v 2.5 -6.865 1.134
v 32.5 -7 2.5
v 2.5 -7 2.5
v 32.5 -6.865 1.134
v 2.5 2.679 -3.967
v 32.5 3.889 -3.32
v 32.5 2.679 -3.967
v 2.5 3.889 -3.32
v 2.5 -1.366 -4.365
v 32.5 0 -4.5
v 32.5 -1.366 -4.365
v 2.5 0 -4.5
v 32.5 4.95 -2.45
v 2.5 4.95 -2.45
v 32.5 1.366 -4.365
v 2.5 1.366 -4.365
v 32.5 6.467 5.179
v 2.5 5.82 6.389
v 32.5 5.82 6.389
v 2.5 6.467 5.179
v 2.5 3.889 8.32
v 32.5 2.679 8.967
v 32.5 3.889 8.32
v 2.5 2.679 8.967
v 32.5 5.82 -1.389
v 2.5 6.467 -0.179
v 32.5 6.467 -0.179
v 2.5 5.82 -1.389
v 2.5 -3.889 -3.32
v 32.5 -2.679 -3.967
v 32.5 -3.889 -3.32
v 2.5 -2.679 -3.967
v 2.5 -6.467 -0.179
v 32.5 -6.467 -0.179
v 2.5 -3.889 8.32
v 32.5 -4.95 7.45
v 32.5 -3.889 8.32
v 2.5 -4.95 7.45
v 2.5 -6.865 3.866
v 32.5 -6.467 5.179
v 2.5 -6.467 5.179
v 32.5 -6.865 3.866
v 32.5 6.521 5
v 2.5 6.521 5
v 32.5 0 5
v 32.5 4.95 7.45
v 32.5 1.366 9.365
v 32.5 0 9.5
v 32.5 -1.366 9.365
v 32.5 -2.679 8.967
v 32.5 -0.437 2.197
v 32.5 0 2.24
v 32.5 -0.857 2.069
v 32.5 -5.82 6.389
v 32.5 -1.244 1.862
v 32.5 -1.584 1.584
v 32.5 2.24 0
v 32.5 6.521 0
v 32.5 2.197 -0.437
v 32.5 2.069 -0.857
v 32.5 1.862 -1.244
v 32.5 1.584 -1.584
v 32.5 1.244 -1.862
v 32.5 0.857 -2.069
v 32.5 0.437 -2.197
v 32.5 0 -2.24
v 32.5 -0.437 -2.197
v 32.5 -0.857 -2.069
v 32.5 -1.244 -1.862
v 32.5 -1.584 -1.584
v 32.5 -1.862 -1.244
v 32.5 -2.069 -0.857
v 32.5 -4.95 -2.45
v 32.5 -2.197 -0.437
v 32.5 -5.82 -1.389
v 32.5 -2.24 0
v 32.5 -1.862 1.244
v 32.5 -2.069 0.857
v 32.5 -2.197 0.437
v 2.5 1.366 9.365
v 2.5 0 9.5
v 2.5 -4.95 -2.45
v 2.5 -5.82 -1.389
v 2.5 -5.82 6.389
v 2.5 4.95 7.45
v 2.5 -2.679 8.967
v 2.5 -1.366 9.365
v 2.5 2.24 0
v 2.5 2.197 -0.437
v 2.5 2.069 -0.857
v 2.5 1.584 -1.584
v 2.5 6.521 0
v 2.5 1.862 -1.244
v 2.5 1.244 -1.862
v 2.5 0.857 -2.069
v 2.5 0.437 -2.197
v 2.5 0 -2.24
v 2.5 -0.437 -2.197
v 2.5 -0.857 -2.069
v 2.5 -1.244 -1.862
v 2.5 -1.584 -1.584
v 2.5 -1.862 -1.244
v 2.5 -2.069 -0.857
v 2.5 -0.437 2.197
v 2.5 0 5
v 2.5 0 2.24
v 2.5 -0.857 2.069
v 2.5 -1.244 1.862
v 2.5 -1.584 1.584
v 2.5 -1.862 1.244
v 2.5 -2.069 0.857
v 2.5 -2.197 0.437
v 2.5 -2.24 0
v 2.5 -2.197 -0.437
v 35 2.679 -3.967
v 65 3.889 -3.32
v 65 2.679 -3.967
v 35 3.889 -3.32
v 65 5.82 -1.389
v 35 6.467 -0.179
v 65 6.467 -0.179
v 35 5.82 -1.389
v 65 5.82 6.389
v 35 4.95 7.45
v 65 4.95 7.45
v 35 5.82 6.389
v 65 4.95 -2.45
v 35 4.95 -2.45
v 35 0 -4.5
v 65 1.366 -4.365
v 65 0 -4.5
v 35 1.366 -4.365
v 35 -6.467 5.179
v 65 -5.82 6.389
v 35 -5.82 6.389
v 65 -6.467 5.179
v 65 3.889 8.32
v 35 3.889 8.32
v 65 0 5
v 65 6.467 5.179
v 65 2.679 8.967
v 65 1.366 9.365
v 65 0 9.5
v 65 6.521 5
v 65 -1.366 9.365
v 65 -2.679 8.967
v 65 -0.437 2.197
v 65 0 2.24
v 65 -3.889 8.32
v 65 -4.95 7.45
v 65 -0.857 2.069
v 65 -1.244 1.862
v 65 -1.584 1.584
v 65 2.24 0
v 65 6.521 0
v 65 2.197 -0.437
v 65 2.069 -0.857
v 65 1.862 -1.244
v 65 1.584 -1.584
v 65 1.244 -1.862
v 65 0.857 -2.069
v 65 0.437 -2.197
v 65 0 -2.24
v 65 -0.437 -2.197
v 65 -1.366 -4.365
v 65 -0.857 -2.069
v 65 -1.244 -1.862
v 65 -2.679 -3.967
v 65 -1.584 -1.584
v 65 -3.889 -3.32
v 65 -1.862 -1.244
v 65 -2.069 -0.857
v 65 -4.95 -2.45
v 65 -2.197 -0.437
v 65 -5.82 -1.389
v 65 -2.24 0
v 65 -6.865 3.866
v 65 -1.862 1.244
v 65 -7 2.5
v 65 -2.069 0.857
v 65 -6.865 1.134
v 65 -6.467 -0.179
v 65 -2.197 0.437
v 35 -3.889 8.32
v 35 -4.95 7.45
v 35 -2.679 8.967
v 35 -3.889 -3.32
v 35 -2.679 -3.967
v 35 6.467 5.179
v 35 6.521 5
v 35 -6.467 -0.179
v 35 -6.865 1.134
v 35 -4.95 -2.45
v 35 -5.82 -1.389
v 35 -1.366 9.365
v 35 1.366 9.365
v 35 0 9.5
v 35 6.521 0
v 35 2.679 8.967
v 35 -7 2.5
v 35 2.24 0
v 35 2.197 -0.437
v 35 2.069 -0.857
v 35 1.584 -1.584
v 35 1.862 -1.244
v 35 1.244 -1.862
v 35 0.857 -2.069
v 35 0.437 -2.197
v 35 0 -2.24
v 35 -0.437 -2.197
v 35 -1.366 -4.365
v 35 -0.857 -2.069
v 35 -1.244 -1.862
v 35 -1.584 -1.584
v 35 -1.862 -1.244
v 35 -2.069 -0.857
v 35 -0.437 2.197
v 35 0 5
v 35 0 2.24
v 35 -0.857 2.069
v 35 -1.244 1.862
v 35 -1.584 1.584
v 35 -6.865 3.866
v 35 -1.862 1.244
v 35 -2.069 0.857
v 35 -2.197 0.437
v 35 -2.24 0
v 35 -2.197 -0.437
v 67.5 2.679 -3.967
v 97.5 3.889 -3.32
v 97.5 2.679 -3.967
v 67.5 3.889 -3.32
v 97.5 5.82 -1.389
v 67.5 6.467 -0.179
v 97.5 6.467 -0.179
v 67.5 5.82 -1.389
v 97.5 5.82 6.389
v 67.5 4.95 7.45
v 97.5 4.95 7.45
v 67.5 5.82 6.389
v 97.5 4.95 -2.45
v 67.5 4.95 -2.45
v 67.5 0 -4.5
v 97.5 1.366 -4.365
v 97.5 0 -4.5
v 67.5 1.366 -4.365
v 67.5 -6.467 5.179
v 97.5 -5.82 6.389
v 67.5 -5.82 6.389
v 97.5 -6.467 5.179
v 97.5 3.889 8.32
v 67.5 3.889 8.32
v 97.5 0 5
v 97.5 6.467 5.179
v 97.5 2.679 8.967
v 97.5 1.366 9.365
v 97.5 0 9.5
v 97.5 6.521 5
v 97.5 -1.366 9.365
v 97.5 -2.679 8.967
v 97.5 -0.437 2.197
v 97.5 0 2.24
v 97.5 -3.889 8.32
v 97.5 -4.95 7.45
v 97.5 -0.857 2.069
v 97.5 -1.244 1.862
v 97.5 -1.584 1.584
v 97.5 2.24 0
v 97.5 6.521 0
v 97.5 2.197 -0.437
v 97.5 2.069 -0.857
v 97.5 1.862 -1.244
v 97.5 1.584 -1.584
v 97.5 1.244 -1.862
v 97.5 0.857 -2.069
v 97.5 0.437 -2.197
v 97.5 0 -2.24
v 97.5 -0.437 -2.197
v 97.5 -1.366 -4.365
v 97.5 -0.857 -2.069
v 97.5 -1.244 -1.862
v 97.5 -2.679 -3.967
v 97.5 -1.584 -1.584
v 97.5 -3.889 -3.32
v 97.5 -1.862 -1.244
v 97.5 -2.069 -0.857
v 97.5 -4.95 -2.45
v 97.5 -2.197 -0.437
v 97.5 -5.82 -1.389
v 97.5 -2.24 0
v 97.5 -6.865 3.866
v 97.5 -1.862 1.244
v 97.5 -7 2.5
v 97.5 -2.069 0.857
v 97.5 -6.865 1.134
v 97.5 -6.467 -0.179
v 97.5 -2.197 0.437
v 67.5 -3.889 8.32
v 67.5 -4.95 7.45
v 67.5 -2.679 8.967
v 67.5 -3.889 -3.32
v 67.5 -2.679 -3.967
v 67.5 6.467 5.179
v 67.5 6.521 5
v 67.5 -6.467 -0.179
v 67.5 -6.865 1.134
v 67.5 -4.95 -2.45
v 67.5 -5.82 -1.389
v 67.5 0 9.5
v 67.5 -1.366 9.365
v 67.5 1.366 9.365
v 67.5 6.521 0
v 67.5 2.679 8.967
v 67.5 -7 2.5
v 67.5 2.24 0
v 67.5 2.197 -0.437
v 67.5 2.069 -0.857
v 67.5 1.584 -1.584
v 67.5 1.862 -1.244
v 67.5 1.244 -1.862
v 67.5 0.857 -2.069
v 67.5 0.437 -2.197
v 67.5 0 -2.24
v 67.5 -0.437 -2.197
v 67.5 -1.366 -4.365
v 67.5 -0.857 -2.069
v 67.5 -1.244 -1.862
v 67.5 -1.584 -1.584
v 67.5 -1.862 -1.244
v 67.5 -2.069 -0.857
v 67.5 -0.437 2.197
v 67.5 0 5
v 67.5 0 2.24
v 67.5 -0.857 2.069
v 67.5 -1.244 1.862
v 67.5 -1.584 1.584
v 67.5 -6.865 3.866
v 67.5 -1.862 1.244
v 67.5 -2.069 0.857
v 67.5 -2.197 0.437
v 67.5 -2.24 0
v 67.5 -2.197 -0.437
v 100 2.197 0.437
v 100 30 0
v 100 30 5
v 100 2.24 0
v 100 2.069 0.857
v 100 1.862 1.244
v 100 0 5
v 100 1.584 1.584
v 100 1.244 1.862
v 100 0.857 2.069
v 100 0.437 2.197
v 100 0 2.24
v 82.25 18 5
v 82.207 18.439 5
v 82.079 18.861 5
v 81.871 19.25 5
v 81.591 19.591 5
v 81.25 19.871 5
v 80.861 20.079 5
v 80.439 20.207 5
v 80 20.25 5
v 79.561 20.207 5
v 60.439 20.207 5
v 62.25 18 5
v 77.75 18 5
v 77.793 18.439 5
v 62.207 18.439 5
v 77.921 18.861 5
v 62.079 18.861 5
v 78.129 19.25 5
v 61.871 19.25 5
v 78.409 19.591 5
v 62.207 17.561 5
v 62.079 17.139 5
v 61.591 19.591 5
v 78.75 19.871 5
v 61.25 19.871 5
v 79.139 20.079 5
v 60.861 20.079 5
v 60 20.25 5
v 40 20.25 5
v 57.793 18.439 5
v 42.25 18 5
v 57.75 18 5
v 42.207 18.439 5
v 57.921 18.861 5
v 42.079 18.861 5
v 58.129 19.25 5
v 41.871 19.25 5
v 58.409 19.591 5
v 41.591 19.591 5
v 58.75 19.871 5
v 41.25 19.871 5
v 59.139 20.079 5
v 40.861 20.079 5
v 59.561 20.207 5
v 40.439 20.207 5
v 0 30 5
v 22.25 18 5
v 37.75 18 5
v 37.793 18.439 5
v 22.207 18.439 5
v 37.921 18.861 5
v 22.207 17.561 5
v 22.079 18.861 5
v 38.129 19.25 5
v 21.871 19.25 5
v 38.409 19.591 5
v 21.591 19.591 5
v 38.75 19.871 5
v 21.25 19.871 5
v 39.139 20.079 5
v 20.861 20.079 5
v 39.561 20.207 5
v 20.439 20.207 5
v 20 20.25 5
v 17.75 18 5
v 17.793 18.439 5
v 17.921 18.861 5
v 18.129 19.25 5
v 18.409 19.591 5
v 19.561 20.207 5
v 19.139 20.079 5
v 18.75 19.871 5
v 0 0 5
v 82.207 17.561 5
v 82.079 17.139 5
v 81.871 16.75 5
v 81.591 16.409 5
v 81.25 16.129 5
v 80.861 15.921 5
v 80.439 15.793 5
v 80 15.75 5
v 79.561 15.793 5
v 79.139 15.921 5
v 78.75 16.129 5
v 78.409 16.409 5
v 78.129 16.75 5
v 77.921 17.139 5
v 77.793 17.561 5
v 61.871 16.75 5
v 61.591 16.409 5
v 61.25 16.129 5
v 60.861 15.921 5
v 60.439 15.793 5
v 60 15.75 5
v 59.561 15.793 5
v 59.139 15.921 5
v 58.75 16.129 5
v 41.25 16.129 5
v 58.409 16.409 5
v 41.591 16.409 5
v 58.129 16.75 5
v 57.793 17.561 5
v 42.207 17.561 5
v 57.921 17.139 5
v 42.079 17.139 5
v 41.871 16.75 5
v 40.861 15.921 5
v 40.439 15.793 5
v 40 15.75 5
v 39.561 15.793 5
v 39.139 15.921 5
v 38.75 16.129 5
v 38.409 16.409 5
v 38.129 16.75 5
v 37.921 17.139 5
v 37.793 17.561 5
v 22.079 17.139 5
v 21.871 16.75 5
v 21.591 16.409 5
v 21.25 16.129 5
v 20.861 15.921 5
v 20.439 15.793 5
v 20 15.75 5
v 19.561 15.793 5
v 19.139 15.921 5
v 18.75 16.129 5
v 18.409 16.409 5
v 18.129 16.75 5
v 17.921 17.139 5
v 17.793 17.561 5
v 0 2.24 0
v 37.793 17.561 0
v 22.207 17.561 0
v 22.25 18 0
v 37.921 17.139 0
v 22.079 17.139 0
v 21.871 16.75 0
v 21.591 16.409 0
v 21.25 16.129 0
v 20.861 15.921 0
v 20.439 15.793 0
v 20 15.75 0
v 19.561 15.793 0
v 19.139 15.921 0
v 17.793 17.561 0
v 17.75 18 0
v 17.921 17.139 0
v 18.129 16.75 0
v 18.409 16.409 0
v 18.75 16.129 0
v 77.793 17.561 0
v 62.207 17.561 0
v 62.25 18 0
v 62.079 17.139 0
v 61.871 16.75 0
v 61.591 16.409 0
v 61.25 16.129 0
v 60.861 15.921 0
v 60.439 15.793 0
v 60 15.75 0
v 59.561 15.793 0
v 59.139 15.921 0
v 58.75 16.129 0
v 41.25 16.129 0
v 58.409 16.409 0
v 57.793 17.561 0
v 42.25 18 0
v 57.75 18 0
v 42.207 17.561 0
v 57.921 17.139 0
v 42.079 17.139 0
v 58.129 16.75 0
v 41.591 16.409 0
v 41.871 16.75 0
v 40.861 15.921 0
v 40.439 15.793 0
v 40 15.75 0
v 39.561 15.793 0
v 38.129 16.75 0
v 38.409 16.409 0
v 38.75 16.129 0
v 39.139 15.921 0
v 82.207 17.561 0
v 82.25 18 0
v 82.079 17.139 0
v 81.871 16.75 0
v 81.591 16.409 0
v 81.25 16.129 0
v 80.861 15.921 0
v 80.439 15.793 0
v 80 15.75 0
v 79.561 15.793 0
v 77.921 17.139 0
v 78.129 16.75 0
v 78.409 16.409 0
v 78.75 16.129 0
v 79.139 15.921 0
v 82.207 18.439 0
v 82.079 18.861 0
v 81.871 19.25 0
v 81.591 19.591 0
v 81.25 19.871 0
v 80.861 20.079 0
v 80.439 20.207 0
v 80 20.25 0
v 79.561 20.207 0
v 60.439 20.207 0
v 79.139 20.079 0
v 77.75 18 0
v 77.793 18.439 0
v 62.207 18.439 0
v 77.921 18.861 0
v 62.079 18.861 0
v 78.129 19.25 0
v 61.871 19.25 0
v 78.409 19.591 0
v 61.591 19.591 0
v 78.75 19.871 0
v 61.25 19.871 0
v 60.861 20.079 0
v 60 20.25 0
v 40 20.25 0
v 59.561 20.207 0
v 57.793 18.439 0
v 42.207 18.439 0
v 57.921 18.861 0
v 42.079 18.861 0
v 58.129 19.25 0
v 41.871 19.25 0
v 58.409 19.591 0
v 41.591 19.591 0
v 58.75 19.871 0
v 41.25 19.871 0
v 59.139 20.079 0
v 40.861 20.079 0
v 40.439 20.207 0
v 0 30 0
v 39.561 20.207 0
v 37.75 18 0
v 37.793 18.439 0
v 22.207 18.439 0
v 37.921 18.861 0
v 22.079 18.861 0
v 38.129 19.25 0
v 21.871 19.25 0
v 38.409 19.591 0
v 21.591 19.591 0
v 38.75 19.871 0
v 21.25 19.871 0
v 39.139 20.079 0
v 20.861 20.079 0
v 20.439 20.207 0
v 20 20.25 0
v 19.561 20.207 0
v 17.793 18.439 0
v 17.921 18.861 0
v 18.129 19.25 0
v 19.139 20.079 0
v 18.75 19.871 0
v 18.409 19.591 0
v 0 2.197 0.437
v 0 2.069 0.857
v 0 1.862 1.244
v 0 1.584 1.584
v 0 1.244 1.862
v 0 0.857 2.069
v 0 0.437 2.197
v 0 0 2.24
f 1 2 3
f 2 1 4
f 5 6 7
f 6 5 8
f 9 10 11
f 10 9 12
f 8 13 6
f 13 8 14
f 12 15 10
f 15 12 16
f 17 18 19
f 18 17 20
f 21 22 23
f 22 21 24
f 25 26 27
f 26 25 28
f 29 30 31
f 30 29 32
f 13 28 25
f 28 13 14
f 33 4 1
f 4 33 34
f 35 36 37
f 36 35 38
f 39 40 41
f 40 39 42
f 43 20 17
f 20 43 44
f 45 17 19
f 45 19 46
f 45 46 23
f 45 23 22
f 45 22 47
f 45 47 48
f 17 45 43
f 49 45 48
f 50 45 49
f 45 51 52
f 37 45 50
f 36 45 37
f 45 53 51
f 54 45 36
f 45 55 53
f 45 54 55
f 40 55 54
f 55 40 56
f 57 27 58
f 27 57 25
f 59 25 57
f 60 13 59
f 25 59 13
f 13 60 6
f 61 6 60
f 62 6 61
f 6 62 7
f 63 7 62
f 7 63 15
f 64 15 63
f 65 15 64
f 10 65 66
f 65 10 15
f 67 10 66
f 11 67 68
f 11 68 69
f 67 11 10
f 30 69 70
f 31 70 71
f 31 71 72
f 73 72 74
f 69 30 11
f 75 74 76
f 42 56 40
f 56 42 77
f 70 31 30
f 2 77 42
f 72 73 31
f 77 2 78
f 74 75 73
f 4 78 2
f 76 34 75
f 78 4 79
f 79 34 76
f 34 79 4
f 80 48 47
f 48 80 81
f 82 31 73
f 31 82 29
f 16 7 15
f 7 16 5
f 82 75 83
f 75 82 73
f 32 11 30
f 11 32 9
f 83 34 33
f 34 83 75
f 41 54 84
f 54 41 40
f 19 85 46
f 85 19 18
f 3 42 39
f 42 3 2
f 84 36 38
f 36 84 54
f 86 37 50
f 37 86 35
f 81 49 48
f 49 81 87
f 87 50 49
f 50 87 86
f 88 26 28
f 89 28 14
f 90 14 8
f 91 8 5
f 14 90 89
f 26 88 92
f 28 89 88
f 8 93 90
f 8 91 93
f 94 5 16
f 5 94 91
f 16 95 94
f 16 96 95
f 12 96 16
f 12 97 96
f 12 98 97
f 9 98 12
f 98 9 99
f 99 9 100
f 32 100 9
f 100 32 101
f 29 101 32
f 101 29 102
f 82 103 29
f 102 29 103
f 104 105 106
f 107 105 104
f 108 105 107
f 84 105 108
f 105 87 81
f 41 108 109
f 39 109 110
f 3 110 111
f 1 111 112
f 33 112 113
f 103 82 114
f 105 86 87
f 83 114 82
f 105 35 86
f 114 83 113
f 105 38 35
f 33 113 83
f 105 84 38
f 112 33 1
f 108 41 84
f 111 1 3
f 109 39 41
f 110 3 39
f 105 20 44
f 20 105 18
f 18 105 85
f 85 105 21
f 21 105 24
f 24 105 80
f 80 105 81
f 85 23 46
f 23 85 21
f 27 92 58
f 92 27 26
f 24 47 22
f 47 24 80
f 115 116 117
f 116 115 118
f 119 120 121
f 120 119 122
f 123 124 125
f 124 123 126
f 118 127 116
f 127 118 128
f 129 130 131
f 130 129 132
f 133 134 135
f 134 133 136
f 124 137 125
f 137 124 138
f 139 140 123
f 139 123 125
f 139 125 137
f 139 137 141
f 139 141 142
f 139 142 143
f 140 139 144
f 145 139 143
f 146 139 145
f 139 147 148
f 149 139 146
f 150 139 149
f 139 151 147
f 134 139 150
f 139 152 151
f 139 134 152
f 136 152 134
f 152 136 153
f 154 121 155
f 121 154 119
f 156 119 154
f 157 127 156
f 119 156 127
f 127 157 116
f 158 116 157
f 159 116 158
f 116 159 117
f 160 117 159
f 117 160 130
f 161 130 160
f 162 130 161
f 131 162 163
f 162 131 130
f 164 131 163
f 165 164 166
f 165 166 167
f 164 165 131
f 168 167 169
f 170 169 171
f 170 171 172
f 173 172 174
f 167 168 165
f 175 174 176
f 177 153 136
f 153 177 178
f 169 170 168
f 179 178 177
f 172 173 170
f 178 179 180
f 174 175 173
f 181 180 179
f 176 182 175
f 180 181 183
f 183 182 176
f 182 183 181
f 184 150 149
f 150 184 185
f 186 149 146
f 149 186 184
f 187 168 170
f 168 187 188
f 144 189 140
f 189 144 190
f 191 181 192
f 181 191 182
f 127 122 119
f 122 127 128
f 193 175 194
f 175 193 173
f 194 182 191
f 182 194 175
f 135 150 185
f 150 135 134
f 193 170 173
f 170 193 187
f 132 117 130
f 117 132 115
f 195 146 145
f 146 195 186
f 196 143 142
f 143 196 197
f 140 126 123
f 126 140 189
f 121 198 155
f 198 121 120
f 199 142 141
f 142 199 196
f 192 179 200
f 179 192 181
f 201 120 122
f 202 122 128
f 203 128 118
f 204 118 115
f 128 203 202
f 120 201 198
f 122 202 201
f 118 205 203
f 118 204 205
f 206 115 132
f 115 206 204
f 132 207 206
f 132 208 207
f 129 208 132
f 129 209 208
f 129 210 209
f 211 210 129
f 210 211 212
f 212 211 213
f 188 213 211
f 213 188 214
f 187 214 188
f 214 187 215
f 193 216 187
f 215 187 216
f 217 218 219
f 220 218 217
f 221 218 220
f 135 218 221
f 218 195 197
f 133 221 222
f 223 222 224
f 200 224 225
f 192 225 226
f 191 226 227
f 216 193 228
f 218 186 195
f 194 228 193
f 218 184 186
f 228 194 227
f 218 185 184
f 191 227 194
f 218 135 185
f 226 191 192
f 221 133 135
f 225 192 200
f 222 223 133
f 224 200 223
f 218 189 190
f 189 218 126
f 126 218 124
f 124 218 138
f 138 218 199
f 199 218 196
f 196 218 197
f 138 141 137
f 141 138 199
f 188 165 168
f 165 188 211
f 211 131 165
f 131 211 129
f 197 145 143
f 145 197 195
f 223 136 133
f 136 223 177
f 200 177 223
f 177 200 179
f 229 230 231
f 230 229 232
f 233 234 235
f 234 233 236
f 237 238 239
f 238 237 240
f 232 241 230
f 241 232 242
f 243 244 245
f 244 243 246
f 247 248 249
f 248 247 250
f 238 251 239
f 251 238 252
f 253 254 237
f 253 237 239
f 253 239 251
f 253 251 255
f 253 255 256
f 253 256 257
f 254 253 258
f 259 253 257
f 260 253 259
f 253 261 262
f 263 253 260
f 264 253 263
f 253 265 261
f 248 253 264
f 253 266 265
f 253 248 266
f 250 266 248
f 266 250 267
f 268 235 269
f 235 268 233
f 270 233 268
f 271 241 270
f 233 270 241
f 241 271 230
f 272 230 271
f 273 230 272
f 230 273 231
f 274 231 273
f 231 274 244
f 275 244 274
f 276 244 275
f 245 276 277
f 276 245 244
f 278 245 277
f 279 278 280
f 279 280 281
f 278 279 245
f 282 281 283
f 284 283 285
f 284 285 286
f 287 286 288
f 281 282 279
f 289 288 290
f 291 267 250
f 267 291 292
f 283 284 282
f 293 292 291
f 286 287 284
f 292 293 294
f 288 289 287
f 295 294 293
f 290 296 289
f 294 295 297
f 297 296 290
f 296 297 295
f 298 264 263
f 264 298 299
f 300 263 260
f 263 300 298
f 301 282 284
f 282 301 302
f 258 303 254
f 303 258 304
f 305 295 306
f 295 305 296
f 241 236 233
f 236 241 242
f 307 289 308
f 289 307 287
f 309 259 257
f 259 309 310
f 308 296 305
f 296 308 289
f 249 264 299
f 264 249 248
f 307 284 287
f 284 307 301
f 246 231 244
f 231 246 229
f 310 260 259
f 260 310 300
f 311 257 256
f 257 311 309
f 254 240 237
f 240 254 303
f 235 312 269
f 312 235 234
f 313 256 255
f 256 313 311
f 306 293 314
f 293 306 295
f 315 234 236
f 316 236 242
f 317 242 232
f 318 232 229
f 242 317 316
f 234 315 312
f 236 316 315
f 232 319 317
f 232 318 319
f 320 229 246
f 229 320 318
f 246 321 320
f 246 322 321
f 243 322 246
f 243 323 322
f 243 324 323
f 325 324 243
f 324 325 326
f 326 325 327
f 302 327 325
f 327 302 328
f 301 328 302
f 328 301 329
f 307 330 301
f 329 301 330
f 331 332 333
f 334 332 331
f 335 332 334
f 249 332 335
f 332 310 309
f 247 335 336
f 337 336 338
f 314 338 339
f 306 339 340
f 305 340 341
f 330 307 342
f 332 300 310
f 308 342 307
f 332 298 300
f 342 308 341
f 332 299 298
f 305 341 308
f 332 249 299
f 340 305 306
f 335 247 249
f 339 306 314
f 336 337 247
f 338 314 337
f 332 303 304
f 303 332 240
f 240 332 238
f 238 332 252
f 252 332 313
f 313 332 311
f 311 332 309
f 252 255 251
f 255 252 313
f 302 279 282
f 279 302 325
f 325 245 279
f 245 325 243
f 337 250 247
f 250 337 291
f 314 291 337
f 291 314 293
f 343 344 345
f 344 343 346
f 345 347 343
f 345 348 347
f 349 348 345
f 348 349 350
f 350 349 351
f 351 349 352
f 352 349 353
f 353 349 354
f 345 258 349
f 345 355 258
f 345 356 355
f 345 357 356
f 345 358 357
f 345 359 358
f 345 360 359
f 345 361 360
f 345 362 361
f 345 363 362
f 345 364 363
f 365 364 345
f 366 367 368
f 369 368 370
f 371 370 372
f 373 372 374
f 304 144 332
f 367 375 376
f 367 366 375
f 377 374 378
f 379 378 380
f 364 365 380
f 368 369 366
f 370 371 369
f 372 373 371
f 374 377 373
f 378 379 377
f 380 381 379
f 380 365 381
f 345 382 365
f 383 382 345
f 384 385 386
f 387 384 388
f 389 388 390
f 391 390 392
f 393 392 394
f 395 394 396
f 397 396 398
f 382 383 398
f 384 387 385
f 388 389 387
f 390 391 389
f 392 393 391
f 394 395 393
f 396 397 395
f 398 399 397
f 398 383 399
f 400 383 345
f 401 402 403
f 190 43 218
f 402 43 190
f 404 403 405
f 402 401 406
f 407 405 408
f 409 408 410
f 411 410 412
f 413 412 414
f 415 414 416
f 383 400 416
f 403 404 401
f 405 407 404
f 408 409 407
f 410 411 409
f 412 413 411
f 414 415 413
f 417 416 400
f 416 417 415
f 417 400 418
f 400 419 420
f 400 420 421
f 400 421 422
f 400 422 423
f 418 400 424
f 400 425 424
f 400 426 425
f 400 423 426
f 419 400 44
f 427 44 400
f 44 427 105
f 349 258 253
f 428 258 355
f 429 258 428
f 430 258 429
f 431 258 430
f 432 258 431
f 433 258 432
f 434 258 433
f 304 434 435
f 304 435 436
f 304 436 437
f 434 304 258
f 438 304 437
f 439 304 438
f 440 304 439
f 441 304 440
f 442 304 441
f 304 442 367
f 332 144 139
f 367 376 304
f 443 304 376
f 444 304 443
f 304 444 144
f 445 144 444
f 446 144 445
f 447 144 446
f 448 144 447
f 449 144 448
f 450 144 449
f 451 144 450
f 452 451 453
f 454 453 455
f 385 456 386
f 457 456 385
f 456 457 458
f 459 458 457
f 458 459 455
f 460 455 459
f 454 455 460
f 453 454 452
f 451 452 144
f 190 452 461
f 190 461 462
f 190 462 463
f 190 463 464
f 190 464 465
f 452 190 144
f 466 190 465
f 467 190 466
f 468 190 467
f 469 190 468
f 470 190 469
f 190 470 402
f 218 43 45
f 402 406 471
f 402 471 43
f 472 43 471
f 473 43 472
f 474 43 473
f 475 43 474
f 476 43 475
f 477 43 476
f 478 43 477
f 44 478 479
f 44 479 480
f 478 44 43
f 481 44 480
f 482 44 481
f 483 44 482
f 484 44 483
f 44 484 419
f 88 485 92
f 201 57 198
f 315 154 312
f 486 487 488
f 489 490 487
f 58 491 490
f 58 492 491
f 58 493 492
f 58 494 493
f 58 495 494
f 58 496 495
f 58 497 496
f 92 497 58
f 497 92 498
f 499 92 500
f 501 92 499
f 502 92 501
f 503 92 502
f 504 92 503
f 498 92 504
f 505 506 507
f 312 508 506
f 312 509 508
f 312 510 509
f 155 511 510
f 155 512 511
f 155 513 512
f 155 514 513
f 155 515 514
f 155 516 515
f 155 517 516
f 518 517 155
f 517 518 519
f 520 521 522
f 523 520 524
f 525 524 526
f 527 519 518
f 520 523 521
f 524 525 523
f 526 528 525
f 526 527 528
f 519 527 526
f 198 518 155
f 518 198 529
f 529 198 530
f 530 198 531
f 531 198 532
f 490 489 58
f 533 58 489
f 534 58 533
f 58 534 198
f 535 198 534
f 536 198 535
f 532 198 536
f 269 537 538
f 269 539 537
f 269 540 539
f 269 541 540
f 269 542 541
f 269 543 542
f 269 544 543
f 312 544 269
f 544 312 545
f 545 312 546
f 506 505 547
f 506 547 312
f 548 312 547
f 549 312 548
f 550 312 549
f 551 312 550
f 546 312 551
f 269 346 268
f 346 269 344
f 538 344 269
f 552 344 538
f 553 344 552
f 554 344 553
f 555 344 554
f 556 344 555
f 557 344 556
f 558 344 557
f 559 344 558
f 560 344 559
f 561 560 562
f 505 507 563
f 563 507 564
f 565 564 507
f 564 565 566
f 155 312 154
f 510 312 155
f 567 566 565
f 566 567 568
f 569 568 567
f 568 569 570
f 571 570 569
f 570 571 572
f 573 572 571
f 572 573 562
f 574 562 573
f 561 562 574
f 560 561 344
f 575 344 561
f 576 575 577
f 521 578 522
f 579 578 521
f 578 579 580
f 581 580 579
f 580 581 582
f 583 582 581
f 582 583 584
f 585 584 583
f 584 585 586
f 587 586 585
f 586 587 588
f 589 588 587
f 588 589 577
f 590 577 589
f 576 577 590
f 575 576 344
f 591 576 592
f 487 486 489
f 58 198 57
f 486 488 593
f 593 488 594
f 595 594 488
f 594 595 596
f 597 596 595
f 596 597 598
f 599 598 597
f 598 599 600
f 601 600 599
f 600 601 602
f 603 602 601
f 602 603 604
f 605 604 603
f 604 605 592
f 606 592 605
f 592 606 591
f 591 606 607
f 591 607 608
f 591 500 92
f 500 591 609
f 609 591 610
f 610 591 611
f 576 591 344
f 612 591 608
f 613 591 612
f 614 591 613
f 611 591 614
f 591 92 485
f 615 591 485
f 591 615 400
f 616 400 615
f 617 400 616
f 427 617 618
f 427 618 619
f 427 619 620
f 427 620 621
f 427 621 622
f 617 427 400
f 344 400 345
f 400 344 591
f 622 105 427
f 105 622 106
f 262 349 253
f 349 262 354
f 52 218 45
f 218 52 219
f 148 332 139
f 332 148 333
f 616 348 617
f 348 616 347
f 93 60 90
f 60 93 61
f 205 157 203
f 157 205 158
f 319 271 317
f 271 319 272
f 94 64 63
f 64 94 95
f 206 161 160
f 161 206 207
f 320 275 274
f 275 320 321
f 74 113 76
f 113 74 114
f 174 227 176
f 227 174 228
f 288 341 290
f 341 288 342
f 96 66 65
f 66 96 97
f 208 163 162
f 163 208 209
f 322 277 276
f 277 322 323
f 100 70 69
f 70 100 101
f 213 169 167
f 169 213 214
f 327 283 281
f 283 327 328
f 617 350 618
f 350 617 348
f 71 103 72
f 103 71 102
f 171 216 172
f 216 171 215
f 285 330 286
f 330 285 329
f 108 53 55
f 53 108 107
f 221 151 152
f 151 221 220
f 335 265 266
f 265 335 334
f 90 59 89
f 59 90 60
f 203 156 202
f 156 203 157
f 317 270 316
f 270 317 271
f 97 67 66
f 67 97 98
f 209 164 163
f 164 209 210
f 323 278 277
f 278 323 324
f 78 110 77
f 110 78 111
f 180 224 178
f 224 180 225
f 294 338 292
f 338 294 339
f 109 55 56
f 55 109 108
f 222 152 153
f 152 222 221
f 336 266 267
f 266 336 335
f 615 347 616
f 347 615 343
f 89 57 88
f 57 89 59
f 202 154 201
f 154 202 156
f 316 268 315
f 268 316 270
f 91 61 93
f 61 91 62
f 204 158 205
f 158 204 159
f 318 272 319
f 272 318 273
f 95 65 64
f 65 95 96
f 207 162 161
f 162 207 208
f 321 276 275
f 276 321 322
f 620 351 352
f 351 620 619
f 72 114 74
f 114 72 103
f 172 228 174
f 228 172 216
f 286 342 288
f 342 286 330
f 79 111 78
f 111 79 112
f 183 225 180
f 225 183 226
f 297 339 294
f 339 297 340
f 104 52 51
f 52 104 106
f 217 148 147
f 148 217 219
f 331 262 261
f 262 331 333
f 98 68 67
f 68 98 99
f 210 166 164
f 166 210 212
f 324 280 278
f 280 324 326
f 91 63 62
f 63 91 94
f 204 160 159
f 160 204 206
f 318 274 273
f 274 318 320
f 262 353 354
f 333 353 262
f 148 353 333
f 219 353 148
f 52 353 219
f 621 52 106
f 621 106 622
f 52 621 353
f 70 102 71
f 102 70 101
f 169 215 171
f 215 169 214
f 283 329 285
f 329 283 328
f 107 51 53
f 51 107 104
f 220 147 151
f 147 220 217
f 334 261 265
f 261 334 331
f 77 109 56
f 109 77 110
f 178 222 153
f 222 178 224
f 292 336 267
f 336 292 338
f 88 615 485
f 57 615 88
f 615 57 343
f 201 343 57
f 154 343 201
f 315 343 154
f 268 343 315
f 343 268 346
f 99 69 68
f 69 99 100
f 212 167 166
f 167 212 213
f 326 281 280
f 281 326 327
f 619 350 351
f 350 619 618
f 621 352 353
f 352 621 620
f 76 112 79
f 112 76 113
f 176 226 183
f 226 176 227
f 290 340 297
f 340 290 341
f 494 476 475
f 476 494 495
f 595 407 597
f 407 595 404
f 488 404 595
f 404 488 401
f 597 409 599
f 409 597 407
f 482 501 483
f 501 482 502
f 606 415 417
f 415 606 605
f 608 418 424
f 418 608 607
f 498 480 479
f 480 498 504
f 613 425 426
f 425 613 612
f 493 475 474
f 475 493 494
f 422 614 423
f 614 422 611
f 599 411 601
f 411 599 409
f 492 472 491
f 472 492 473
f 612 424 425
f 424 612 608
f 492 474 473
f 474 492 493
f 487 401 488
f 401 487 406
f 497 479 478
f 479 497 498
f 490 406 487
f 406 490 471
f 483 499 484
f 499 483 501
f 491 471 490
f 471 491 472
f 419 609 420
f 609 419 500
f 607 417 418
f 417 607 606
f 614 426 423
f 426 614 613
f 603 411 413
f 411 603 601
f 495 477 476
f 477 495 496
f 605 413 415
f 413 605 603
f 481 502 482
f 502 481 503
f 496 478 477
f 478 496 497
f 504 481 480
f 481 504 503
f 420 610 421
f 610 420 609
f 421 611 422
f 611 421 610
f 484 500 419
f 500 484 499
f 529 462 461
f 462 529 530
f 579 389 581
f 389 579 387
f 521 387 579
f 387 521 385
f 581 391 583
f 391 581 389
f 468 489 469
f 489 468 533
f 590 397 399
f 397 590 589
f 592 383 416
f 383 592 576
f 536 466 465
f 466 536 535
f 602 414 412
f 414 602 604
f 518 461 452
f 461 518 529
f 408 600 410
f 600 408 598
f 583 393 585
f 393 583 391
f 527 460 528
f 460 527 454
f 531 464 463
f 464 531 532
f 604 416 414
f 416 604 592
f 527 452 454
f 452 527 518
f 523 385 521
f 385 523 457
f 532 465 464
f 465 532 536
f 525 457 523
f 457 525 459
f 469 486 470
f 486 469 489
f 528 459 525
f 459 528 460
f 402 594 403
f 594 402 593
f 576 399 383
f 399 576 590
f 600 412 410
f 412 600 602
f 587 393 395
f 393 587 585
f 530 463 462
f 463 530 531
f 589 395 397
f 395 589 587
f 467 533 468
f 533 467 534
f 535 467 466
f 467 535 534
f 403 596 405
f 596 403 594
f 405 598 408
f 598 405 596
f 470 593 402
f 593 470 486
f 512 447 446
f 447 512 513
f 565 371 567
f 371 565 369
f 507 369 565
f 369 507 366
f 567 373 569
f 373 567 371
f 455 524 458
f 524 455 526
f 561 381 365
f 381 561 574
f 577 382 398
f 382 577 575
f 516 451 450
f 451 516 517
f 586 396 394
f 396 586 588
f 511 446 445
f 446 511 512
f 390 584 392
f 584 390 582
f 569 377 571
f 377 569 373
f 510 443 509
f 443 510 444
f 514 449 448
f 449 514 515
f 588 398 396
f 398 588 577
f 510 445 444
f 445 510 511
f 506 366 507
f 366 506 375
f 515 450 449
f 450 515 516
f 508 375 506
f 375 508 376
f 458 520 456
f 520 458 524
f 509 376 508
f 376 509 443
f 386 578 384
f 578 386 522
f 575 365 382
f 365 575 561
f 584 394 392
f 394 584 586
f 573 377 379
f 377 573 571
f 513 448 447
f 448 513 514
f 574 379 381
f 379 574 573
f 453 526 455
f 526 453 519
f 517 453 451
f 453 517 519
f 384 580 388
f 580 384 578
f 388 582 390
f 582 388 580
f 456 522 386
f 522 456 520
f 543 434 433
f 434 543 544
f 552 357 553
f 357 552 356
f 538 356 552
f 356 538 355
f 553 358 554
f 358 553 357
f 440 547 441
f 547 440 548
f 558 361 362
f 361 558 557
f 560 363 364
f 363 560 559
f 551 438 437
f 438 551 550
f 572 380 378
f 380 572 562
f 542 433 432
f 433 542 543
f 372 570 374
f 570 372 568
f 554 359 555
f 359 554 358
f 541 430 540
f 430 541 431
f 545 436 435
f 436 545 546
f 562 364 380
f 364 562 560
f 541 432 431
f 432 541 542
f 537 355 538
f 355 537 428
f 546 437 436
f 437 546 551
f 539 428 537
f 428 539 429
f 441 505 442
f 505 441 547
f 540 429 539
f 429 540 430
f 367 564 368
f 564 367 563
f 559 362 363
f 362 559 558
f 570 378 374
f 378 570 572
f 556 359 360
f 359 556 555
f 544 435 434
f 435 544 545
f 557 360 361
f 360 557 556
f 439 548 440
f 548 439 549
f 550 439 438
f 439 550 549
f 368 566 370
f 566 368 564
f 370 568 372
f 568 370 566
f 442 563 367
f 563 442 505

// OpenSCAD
$fn = 32;

// ----------------------------------------------------------------------
// Hinge leaf: 100 x 37 x 14 mm
// ----------------------------------------------------------------------

// --- parameters (mm) ---
tab_len = 100;            // leaf length, X
tab_w = 30;               // leaf width, Y
tab_t = 5;                // leaf thickness
ring_d = 14;              // knuckle diameter
ring_w = 30;              // knuckle width
knuckle_n = 3;            // number of knuckles
pin_d = 4.48;             // pin bore
gap = 2.5;                // gap between the knuckles
screw_d = 4.5;            // screw clearance

module leaf() {
  cube([tab_len, tab_w, tab_t]);
}

module knuckles() {
  /* barrels sit on the leaf edge, the pin axis at half the leaf thickness */
  for (i = [0 : knuckle_n - 1])
    translate([gap + i * (ring_w + gap), 0, tab_t * 0.5])
      rotate([0, 90, 0]) cylinder(h = ring_w, d = ring_d);
}

difference() {
  union() {
    leaf();
    knuckles();
  }
  rotate([0, 90, 0]) translate([0, 0, -1])
    cylinder(h = tab_len + 2, d = pin_d);
  translate([20, tab_w * 0.6, -1]) cylinder(h = tab_t + 2, d = screw_d);
  translate([40, tab_w * 0.6, -1]) cylinder(h = tab_t + 2, d = screw_d);
  translate([60, tab_w * 0.6, -1]) cylinder(h = tab_t + 2, d = screw_d);
  translate([80, tab_w * 0.6, -1]) cylinder(h = tab_t + 2, d = screw_d);
}
